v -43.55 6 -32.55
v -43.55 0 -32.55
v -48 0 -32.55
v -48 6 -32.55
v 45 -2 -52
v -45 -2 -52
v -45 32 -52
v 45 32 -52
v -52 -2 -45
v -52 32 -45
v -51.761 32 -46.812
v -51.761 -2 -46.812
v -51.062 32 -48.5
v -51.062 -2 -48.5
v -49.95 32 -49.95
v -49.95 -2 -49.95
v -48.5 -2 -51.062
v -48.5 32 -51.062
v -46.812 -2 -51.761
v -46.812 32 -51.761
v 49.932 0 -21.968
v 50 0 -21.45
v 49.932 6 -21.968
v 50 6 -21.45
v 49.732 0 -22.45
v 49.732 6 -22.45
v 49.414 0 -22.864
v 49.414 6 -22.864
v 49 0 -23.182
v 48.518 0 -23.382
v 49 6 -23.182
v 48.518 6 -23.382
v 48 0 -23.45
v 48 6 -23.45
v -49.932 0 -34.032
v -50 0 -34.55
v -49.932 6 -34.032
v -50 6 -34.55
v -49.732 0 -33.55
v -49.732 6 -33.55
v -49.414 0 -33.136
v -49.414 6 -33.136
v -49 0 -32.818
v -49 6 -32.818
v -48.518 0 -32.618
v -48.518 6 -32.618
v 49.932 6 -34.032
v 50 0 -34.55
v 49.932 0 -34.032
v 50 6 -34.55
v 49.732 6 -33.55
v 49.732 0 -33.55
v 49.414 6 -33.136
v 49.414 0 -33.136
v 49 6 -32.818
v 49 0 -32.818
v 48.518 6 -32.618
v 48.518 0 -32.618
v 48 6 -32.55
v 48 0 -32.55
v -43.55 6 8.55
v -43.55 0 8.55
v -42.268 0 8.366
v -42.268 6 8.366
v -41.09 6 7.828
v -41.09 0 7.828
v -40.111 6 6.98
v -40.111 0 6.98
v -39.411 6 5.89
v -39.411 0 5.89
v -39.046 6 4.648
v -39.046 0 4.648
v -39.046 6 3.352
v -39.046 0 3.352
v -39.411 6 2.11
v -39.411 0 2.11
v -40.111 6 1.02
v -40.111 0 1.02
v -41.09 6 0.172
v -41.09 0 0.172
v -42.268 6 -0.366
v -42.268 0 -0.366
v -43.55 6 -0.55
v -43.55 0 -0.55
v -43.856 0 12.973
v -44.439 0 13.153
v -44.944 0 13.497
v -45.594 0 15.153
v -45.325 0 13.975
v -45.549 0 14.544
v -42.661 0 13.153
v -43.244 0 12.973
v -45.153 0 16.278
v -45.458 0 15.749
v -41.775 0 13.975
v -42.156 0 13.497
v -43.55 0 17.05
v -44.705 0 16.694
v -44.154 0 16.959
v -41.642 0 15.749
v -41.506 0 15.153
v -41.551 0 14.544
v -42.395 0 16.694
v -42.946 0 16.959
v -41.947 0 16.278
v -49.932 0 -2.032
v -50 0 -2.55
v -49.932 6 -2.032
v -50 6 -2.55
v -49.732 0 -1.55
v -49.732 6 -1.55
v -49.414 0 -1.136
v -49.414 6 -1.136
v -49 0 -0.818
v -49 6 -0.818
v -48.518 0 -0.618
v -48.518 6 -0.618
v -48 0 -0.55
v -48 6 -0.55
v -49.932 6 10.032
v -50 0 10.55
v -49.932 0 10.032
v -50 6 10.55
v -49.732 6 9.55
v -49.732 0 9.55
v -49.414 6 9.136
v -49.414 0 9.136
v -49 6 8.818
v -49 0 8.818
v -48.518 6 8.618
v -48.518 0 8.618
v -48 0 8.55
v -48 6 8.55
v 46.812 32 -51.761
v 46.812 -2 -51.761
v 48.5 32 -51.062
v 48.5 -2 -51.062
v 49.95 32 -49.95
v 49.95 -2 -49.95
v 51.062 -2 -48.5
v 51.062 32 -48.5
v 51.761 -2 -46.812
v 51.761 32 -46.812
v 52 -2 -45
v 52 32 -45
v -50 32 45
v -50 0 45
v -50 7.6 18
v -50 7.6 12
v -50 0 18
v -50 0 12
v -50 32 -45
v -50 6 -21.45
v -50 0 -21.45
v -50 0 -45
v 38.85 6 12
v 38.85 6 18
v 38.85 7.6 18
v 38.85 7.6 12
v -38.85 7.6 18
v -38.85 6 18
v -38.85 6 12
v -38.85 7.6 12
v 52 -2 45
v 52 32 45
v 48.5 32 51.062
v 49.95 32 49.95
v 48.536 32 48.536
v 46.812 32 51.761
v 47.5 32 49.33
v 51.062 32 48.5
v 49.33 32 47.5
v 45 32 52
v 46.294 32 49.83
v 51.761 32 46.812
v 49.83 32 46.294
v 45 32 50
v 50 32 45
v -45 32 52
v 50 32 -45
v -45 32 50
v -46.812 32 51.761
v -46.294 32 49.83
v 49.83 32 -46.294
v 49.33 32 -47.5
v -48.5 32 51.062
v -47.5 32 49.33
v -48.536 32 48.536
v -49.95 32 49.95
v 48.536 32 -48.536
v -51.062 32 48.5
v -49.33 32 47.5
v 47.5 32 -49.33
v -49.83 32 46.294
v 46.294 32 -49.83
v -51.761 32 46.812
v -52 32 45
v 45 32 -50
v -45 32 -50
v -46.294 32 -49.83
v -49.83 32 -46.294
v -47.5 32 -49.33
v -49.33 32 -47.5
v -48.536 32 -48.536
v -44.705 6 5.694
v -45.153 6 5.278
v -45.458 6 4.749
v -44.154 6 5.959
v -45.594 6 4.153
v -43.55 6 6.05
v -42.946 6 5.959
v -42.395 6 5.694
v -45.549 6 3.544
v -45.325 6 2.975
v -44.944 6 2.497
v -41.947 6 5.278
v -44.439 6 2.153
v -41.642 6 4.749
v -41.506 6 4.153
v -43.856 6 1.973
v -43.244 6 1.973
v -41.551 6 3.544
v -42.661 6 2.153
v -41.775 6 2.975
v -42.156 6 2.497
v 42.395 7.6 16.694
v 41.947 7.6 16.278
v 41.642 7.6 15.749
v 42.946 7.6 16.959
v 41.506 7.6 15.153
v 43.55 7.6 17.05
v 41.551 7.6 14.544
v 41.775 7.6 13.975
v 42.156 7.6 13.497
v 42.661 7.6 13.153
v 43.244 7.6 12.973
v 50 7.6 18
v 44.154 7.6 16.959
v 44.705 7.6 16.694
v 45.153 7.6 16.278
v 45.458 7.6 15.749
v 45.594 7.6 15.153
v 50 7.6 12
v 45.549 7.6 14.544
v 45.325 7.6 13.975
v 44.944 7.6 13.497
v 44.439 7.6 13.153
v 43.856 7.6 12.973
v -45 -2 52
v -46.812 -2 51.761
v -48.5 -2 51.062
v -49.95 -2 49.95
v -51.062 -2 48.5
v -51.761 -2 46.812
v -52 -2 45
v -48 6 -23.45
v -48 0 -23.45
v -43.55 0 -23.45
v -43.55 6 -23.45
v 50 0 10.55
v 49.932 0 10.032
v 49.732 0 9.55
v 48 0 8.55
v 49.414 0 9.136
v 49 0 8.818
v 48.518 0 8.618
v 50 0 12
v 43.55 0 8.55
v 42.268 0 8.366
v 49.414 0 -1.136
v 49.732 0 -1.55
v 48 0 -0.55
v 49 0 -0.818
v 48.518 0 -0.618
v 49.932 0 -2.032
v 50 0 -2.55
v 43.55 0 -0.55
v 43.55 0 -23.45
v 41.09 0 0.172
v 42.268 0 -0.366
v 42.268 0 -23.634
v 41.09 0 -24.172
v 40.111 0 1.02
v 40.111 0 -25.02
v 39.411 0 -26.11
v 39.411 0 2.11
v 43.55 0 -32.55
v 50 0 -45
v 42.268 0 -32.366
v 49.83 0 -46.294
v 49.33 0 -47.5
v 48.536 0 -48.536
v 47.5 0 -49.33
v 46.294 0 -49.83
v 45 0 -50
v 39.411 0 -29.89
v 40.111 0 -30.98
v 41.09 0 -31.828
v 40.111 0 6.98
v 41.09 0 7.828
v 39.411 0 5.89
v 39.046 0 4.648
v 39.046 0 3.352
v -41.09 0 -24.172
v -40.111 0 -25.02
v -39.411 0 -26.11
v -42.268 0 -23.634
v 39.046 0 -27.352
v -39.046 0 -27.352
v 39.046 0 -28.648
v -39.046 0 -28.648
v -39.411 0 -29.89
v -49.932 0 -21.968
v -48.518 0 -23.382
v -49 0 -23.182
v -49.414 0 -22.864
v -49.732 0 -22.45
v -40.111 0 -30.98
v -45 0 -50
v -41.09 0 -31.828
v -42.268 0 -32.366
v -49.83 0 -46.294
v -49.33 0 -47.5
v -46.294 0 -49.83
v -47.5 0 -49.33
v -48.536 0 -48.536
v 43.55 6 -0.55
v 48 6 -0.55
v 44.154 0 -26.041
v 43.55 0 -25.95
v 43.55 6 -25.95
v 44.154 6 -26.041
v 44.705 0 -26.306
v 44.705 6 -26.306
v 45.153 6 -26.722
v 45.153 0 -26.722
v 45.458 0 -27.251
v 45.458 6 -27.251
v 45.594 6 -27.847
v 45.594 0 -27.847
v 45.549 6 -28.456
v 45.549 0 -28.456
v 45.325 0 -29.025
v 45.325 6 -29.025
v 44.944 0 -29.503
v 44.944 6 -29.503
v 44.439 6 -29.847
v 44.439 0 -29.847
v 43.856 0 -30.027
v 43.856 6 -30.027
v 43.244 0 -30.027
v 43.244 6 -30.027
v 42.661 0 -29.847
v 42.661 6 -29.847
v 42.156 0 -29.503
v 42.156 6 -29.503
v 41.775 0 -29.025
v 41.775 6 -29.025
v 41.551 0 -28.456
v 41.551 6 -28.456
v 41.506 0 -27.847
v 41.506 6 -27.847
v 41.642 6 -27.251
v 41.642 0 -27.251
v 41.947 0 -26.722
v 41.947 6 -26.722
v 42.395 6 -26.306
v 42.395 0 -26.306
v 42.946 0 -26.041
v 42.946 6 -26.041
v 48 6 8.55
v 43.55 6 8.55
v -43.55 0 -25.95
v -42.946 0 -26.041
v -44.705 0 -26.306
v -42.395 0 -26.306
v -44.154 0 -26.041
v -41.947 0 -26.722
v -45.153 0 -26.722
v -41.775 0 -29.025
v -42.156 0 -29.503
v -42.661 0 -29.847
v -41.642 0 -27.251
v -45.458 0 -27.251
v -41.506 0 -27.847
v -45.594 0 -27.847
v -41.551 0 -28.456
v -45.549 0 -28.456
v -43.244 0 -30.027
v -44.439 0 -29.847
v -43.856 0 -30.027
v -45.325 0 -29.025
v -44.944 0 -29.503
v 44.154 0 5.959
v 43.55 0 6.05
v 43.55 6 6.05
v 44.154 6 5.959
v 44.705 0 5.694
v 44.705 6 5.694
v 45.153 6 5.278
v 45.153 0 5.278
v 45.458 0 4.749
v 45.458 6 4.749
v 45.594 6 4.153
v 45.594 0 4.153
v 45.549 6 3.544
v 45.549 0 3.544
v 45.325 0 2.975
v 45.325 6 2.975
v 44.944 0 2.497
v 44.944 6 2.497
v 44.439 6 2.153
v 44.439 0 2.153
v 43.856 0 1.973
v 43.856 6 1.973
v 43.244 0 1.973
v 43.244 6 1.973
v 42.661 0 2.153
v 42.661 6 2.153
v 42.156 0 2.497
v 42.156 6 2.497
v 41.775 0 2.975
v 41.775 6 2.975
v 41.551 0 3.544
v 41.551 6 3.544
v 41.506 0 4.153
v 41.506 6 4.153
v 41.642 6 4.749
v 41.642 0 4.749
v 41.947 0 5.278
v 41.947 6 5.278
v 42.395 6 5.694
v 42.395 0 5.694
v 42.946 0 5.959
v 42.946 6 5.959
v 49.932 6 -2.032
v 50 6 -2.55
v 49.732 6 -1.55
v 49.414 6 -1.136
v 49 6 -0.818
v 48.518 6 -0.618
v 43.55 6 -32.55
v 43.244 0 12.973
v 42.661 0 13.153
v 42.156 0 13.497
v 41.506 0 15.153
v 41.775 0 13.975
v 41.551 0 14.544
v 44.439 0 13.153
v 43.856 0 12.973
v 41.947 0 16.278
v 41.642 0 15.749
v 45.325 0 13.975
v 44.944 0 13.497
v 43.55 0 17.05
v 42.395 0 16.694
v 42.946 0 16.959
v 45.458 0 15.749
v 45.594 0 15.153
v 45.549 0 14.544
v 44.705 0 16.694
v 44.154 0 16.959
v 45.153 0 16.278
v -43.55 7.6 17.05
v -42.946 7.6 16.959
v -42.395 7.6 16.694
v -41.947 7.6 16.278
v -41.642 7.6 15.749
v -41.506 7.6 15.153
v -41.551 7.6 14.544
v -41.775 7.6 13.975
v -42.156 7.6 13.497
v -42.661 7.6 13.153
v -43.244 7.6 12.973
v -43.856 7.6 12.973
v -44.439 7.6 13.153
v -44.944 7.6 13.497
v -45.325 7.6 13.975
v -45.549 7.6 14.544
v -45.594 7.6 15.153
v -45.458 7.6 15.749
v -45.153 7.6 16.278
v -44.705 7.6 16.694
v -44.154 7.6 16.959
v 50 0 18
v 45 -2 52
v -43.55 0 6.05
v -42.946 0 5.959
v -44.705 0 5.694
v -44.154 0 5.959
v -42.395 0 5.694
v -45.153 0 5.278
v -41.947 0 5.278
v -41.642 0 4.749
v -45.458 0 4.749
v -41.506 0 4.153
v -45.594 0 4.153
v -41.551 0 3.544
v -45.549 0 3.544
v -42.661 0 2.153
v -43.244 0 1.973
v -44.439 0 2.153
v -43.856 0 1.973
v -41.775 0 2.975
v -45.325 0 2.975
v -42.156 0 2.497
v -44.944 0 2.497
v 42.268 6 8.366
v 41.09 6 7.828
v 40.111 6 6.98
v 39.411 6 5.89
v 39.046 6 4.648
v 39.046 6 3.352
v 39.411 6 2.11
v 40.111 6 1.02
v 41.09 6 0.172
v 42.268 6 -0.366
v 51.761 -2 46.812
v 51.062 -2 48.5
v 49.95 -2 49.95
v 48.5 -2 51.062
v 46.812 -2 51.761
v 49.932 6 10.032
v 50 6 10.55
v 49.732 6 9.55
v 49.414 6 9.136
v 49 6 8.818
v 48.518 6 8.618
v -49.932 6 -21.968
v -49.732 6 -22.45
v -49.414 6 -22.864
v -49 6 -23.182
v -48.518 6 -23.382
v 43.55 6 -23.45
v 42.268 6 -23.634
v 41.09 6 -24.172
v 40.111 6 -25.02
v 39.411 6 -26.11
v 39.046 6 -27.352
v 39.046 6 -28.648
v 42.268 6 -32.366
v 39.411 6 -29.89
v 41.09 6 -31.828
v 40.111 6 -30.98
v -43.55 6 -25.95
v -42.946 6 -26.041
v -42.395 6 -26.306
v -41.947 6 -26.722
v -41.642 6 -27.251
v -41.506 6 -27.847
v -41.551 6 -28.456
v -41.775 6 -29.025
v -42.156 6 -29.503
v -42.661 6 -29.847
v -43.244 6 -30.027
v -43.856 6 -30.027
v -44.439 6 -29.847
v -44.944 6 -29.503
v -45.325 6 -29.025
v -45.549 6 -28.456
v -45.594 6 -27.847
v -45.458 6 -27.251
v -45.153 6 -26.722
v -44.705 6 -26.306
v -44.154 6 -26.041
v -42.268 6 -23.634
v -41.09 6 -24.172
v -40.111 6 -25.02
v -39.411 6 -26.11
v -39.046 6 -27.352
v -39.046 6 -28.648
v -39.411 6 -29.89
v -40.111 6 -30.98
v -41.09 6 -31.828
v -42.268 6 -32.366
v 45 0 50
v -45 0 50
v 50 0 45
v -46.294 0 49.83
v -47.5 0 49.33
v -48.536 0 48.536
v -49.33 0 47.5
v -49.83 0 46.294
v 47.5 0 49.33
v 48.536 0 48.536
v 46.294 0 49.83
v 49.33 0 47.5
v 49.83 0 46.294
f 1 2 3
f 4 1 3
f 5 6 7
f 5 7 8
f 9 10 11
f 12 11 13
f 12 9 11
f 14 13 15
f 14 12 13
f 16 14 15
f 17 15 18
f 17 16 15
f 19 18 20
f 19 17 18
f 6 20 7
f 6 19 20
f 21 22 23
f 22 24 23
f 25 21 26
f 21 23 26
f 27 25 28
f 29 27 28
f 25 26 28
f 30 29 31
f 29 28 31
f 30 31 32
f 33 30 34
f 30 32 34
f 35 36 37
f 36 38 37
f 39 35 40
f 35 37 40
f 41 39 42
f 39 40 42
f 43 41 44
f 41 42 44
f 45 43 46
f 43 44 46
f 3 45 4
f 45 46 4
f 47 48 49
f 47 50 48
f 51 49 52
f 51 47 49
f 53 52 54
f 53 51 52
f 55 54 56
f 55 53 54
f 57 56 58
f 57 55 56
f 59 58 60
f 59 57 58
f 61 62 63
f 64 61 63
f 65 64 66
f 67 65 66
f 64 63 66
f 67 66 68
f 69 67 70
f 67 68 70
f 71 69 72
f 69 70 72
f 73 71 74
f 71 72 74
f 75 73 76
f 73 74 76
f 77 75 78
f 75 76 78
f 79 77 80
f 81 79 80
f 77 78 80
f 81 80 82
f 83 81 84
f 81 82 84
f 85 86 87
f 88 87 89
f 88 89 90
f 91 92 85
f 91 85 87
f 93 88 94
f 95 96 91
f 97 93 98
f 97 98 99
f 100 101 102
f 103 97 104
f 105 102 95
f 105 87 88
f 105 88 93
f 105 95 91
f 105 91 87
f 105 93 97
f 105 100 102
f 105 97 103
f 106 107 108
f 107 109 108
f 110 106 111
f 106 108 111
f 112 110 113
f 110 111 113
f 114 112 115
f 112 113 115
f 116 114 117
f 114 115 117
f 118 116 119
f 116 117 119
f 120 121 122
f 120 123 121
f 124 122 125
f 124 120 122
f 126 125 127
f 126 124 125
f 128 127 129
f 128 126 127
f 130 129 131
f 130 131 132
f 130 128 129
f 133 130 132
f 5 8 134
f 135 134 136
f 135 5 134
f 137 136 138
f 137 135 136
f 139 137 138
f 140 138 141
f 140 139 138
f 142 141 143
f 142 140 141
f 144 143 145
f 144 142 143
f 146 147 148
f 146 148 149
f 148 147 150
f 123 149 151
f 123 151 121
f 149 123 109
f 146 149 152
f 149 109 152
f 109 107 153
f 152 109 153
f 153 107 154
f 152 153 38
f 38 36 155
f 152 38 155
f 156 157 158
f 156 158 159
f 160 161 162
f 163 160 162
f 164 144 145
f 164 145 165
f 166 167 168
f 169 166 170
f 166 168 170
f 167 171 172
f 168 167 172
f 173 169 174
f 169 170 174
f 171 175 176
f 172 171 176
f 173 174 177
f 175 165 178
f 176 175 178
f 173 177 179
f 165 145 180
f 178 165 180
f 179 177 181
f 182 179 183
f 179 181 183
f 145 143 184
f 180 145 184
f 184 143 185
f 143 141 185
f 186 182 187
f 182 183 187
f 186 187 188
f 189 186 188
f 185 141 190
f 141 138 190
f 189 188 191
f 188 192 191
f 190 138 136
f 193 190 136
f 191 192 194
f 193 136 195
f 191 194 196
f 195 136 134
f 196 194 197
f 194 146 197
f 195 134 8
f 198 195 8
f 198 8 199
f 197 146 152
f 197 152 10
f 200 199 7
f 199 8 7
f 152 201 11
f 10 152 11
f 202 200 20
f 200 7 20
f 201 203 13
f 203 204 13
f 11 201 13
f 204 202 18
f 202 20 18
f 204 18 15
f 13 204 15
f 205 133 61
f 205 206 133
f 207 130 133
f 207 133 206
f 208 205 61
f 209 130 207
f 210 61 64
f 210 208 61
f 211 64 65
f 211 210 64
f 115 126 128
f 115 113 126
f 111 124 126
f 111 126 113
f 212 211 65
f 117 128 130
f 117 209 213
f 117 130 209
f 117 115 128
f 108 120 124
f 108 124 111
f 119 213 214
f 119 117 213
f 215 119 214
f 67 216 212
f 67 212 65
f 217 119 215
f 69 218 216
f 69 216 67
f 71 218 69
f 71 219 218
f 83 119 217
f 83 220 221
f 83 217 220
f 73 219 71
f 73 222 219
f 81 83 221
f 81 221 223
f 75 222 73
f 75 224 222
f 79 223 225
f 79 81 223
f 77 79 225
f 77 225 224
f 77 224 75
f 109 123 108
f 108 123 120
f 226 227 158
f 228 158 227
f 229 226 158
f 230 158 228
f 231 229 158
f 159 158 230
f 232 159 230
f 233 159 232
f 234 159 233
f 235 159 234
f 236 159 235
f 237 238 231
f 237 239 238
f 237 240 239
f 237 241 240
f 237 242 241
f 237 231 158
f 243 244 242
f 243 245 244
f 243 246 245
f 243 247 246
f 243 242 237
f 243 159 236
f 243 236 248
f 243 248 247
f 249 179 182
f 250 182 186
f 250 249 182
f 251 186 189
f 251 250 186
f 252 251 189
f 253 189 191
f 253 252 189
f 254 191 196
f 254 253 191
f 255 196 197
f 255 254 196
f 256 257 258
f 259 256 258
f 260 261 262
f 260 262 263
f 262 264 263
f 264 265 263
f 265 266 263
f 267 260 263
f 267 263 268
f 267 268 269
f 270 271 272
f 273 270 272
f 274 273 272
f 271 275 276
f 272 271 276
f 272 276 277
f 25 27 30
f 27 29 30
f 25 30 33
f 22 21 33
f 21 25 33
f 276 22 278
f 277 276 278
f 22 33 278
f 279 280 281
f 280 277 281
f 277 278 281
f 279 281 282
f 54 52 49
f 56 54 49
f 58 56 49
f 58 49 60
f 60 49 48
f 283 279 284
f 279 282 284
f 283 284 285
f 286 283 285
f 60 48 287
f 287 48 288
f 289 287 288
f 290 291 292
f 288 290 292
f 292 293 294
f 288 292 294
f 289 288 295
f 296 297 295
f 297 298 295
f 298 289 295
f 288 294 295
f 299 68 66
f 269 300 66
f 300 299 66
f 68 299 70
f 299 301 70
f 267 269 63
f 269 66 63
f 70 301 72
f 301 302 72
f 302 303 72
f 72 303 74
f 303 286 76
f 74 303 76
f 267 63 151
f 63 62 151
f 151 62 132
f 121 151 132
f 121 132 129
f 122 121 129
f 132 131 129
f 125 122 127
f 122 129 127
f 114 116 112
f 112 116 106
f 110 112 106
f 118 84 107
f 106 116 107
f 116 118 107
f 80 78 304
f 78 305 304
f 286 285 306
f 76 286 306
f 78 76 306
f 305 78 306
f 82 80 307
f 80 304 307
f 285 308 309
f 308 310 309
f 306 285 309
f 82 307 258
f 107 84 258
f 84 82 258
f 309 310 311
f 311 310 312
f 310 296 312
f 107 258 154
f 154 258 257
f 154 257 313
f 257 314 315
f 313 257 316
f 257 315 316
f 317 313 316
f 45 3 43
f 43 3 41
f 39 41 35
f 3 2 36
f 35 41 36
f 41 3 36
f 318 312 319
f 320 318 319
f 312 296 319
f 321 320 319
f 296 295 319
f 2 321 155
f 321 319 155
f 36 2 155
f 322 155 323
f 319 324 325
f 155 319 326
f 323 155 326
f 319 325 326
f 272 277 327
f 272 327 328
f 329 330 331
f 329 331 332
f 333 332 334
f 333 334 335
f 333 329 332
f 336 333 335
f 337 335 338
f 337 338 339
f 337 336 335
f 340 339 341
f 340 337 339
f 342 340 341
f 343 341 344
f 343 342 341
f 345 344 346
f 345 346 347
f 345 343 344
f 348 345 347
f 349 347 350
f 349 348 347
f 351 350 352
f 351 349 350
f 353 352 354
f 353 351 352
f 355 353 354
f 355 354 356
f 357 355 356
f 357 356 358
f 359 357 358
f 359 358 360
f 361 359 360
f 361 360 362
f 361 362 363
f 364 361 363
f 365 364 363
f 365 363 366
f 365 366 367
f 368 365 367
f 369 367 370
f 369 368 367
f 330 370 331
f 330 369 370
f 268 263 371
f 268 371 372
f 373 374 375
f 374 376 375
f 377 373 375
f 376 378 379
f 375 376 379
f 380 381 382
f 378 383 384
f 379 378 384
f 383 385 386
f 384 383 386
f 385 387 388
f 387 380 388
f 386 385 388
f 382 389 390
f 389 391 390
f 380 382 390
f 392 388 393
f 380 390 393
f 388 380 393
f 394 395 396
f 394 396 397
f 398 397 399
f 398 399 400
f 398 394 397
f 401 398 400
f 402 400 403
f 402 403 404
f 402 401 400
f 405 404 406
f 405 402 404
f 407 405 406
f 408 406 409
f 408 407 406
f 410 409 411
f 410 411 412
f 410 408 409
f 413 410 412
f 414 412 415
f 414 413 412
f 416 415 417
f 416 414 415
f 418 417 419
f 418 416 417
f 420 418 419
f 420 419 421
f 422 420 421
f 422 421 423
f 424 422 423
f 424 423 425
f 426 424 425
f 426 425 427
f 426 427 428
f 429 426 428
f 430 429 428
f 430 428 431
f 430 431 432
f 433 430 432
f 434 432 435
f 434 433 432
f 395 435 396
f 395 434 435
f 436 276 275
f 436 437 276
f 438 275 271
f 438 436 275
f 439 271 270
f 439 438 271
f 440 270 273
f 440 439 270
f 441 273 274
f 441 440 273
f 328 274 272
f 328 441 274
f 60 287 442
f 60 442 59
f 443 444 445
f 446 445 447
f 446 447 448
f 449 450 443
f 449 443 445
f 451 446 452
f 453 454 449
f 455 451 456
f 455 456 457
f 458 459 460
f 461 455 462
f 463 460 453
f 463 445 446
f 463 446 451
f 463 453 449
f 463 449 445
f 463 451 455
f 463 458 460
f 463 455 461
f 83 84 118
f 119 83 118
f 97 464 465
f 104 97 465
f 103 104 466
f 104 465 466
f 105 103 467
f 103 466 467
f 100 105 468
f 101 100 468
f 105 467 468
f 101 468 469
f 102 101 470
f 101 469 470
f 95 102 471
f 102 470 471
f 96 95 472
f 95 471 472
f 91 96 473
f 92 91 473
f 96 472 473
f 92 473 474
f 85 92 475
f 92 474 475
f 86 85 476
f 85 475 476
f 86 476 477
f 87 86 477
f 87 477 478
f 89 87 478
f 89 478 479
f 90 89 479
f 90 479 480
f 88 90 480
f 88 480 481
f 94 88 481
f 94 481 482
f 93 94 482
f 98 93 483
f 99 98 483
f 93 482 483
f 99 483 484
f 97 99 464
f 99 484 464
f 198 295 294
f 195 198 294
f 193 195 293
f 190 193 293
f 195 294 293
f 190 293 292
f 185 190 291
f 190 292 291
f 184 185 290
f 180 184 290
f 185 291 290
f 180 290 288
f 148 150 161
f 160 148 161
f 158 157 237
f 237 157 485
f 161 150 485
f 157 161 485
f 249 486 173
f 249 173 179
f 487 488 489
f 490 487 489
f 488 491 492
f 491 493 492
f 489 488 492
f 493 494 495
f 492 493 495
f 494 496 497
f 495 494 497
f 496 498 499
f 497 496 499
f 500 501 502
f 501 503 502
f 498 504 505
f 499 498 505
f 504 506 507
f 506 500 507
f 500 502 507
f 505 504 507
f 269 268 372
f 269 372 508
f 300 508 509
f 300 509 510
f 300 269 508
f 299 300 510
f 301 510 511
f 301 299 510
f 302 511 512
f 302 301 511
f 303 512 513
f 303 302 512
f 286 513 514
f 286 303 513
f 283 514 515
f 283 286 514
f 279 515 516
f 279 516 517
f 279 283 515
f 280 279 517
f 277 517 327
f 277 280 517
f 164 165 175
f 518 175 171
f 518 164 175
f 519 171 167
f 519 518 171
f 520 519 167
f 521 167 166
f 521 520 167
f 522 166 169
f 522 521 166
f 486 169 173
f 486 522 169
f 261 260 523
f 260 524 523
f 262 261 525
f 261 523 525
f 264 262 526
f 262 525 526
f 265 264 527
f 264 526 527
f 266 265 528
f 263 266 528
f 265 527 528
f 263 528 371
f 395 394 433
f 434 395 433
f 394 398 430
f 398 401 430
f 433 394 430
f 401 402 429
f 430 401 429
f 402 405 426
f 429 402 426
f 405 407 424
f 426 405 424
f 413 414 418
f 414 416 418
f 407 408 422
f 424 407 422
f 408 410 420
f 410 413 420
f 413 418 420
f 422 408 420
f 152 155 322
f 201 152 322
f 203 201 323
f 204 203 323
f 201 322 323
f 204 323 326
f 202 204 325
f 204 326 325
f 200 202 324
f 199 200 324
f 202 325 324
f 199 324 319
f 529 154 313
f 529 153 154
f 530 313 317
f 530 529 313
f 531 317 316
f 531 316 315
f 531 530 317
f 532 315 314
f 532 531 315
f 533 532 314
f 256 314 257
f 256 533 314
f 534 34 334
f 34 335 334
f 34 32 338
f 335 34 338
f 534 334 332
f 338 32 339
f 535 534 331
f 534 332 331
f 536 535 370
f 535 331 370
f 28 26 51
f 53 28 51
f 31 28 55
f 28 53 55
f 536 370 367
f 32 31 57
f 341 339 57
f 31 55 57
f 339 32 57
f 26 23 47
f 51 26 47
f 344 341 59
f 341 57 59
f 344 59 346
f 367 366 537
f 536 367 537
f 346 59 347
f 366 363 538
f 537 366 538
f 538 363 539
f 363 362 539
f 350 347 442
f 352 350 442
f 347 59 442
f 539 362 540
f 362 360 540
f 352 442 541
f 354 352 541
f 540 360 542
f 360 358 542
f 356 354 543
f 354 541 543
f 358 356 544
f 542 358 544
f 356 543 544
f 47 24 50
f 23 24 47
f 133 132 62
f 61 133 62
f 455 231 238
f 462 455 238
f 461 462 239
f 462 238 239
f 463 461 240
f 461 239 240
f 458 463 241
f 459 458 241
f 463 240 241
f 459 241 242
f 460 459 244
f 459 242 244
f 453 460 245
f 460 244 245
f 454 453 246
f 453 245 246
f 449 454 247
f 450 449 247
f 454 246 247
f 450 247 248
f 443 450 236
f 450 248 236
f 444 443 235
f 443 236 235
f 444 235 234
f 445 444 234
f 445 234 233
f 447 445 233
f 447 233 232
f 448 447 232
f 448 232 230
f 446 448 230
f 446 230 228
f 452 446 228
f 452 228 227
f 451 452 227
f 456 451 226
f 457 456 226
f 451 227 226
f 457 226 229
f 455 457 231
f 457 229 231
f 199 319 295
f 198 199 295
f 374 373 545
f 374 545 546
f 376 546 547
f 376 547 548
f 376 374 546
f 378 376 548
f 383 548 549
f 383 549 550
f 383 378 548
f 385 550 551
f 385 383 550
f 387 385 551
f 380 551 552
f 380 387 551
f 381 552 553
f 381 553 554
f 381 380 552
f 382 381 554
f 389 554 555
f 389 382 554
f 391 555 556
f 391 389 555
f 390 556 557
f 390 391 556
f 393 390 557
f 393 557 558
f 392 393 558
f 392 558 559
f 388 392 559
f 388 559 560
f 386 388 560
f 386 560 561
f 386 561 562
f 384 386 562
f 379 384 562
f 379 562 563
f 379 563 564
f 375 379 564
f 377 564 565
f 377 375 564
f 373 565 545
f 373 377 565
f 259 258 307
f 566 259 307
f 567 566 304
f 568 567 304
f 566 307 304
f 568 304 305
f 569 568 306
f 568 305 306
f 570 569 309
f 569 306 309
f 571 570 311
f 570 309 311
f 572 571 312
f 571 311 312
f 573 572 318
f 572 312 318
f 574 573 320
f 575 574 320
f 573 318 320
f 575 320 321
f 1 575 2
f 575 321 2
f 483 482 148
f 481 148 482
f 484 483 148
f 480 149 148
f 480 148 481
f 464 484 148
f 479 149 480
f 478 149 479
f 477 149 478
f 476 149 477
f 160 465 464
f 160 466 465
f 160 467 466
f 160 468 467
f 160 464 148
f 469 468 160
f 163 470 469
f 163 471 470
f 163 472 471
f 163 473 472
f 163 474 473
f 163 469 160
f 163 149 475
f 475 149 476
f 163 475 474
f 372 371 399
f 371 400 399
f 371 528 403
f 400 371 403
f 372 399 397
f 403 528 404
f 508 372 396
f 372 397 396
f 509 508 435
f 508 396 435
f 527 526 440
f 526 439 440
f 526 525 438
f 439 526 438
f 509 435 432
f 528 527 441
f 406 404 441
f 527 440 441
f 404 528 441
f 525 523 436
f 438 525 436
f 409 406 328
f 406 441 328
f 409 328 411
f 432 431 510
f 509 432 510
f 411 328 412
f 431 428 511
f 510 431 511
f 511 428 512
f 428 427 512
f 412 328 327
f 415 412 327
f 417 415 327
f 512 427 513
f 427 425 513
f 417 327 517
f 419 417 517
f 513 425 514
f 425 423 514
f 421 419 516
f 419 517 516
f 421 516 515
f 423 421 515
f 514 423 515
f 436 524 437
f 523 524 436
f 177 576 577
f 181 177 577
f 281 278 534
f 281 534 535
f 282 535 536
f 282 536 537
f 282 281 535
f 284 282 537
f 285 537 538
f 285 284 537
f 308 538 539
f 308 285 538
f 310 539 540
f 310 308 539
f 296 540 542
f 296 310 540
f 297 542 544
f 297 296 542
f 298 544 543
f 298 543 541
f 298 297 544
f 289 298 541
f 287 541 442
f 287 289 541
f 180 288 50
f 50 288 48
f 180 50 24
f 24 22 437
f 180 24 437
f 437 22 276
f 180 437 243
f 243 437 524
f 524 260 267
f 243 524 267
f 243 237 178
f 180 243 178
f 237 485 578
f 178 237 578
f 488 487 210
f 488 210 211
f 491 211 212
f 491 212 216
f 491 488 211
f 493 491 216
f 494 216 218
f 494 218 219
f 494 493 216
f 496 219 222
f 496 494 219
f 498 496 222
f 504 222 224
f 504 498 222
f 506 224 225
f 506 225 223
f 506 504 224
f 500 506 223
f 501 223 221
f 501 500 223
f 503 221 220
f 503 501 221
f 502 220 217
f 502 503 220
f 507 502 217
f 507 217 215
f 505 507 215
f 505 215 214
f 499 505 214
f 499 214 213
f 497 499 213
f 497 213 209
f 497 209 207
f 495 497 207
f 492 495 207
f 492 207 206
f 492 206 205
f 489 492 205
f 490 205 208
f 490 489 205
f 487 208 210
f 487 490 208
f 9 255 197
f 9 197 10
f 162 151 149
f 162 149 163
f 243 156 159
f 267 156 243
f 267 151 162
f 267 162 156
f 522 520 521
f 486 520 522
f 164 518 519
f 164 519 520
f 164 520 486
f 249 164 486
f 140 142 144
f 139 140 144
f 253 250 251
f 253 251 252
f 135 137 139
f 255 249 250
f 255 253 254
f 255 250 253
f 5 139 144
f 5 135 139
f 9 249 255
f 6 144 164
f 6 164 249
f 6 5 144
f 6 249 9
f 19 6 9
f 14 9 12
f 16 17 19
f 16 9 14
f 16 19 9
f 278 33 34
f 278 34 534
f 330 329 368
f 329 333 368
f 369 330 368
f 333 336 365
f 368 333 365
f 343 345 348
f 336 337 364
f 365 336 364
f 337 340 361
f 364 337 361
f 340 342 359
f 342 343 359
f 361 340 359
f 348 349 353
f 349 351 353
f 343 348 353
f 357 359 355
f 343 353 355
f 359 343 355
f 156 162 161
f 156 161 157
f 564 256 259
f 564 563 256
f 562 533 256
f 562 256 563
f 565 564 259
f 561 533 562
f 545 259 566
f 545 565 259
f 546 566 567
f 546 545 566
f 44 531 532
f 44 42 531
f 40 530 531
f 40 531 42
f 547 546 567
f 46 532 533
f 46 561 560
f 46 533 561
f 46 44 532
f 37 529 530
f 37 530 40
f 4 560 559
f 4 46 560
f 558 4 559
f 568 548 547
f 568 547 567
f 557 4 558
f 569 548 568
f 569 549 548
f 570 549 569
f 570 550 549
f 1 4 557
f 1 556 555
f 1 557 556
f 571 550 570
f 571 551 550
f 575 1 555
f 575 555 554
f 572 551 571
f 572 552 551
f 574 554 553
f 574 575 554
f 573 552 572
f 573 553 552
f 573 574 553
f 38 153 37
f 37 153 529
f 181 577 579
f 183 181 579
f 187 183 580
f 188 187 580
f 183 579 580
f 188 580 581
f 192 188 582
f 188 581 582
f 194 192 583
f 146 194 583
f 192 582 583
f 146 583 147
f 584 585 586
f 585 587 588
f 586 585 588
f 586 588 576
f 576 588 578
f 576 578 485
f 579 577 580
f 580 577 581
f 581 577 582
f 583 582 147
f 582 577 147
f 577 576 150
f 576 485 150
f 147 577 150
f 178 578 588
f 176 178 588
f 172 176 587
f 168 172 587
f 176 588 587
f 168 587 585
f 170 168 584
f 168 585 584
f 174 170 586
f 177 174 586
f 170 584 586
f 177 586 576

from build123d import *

# Parameters (mm, degrees)
BOSS_EXTRUDE1_DEPTH = 32
SHELL1_T            = 2
SKETCH2_R           = 2.05
SKETCH2_W           = 100
SKETCH2_H           = 6
BOSS_EXTRUDE2_DEPTH = 6
FILLET1_R           = 2
SKETCH3_W           = 11.15
SKETCH3_H           = 6
BOSS_EXTRUDE3_DEPTH = 1.6
SKETCH4_R           = 2.05
CUT_EXTRUDE1_DEPTH  = 7.6


with BuildPart() as part:
    # Sketch1 → Boss-Extrude1 (new body)
    with BuildSketch(Plane(origin=(0, 0, 0), x_dir=(1, 0, 0), z_dir=(0, 1, 0))):
        with BuildLine():
            Line((-45, 50), (45, 50))
            ThreePointArc((45, 50), (48.535533906, 48.535533906), (50, 45))
            Line((50, 45), (50, -45))
            ThreePointArc((50, -45), (48.535533906, -48.535533906), (45, -50))
            Line((45, -50), (-45, -50))
            ThreePointArc((-45, -50), (-48.535533906, -48.535533906), (-50, -45))
            Line((-50, -45), (-50, 45))
            ThreePointArc((-50, 45), (-48.535533906, 48.535533906), (-45, 50))
        make_face()
    extrude(amount=BOSS_EXTRUDE1_DEPTH)

    # Shell1
    shell1_openings = [part.faces().sort_by_distance(p)[0] for p in [
        (0, 32, 0),
    ]]
    offset(amount=SHELL1_T, openings=shell1_openings, kind=Kind.INTERSECTION)

    # Sketch2 → Boss-Extrude2 (add)
    # profile 1 of 5: a face of its own
    with BuildSketch(Plane(origin=(0, 0, 0), x_dir=(1, 0, 0), z_dir=(0, 1, 0))):
        with BuildLine():
            Line((-43.55, 32.55), (-50, 32.55))
            Line((-50, 32.55), (-50, 23.45))
            Line((-50, 23.45), (-43.55, 23.45))
            ThreePointArc((-43.55, 23.45), (-39, 28), (-43.55, 32.55))
        make_face()
        with Locations(Location((-43.55, 28, 0), (0, 0, 270))):
            Circle(SKETCH2_R, mode=Mode.SUBTRACT)
    # profile 2 of 5: a face of its own
    with BuildSketch(Plane(origin=(0, 0, 0), x_dir=(1, 0, 0), z_dir=(0, 1, 0))):
        with BuildLine():
            Line((-43.55, 0.55), (-50, 0.55))
            Line((-50, 0.55), (-50, -8.55))
            Line((-50, -8.55), (-43.55, -8.55))
            ThreePointArc((-43.55, -8.55), (-39, -4), (-43.55, 0.55))
        make_face()
        with Locations(Location((-43.55, -4, 0), (0, 0, 270))):
            Circle(SKETCH2_R, mode=Mode.SUBTRACT)
    # profile 3 of 5: a face of its own
    with BuildSketch(Plane(origin=(0, 0, 0), x_dir=(1, 0, 0), z_dir=(0, 1, 0))):
        with BuildLine():
            Line((43.55, 0.55), (50, 0.55))
            Line((50, 0.55), (50, -8.55))
            Line((50, -8.55), (43.55, -8.55))
            ThreePointArc((43.55, -8.55), (39, -4), (43.55, 0.55))
        make_face()
        with Locations(Location((43.55, -4, 0), (0, 0, 270))):
            Circle(SKETCH2_R, mode=Mode.SUBTRACT)
    # profile 4 of 5: a face of its own
    with BuildSketch(Plane(origin=(0, 0, 0), x_dir=(1, 0, 0), z_dir=(0, 1, 0))):
        with BuildLine():
            Line((43.55, 32.55), (50, 32.55))
            Line((50, 32.55), (50, 23.45))
            Line((50, 23.45), (43.55, 23.45))
            ThreePointArc((43.55, 23.45), (39, 28), (43.55, 32.55))
        make_face()
        with Locations(Location((43.55, 28, 0), (0, 0, 270))):
            Circle(SKETCH2_R, mode=Mode.SUBTRACT)
    # profile 5 of 5: a face of its own
    with BuildSketch(Plane(origin=(0, 0, 0), x_dir=(1, 0, 0), z_dir=(0, 1, 0))):
        with Locations((0, -15)):
            Rectangle(SKETCH2_W, SKETCH2_H)
    extrude(amount=BOSS_EXTRUDE2_DEPTH)

    # Fillet1
    fillet1_edges = [part.edges().sort_by_distance(p)[0] for p in [
        (50, 3, 8.55),
        (50, 3, -0.55),
        (50, 3, -23.45),
        (50, 3, -32.55),
        (-50, 3, -23.45),
        (-50, 3, -32.55),
        (-50, 3, -0.55),
        (-50, 3, 8.55),
    ]]
    fillet(fillet1_edges, radius=FILLET1_R)

    # Sketch3 → Boss-Extrude3 (add)
    with BuildSketch(Plane(origin=(0, 6, 0), x_dir=(1, 0, 0), z_dir=(0, 1, 0))):
        with Locations((-44.425, -15)):
            Rectangle(SKETCH3_W, SKETCH3_H)
        with Locations((44.425, -15)):
            Rectangle(SKETCH3_W, SKETCH3_H)
    extrude(amount=BOSS_EXTRUDE3_DEPTH)

    # Sketch4 → Cut-Extrude1 (cut)
    with BuildSketch(Plane(origin=(0, 7.6, 0), x_dir=(1, 0, 0), z_dir=(0, 1, 0))):
        with Locations(Location((-43.55, -15, 0), (0, 0, 270))):
            Circle(SKETCH4_R)
        with Locations(Location((43.55, -15, 0), (0, 0, 270))):
            Circle(SKETCH4_R)
    extrude(amount=-CUT_EXTRUDE1_DEPTH, mode=Mode.SUBTRACT)


solid = part.part
